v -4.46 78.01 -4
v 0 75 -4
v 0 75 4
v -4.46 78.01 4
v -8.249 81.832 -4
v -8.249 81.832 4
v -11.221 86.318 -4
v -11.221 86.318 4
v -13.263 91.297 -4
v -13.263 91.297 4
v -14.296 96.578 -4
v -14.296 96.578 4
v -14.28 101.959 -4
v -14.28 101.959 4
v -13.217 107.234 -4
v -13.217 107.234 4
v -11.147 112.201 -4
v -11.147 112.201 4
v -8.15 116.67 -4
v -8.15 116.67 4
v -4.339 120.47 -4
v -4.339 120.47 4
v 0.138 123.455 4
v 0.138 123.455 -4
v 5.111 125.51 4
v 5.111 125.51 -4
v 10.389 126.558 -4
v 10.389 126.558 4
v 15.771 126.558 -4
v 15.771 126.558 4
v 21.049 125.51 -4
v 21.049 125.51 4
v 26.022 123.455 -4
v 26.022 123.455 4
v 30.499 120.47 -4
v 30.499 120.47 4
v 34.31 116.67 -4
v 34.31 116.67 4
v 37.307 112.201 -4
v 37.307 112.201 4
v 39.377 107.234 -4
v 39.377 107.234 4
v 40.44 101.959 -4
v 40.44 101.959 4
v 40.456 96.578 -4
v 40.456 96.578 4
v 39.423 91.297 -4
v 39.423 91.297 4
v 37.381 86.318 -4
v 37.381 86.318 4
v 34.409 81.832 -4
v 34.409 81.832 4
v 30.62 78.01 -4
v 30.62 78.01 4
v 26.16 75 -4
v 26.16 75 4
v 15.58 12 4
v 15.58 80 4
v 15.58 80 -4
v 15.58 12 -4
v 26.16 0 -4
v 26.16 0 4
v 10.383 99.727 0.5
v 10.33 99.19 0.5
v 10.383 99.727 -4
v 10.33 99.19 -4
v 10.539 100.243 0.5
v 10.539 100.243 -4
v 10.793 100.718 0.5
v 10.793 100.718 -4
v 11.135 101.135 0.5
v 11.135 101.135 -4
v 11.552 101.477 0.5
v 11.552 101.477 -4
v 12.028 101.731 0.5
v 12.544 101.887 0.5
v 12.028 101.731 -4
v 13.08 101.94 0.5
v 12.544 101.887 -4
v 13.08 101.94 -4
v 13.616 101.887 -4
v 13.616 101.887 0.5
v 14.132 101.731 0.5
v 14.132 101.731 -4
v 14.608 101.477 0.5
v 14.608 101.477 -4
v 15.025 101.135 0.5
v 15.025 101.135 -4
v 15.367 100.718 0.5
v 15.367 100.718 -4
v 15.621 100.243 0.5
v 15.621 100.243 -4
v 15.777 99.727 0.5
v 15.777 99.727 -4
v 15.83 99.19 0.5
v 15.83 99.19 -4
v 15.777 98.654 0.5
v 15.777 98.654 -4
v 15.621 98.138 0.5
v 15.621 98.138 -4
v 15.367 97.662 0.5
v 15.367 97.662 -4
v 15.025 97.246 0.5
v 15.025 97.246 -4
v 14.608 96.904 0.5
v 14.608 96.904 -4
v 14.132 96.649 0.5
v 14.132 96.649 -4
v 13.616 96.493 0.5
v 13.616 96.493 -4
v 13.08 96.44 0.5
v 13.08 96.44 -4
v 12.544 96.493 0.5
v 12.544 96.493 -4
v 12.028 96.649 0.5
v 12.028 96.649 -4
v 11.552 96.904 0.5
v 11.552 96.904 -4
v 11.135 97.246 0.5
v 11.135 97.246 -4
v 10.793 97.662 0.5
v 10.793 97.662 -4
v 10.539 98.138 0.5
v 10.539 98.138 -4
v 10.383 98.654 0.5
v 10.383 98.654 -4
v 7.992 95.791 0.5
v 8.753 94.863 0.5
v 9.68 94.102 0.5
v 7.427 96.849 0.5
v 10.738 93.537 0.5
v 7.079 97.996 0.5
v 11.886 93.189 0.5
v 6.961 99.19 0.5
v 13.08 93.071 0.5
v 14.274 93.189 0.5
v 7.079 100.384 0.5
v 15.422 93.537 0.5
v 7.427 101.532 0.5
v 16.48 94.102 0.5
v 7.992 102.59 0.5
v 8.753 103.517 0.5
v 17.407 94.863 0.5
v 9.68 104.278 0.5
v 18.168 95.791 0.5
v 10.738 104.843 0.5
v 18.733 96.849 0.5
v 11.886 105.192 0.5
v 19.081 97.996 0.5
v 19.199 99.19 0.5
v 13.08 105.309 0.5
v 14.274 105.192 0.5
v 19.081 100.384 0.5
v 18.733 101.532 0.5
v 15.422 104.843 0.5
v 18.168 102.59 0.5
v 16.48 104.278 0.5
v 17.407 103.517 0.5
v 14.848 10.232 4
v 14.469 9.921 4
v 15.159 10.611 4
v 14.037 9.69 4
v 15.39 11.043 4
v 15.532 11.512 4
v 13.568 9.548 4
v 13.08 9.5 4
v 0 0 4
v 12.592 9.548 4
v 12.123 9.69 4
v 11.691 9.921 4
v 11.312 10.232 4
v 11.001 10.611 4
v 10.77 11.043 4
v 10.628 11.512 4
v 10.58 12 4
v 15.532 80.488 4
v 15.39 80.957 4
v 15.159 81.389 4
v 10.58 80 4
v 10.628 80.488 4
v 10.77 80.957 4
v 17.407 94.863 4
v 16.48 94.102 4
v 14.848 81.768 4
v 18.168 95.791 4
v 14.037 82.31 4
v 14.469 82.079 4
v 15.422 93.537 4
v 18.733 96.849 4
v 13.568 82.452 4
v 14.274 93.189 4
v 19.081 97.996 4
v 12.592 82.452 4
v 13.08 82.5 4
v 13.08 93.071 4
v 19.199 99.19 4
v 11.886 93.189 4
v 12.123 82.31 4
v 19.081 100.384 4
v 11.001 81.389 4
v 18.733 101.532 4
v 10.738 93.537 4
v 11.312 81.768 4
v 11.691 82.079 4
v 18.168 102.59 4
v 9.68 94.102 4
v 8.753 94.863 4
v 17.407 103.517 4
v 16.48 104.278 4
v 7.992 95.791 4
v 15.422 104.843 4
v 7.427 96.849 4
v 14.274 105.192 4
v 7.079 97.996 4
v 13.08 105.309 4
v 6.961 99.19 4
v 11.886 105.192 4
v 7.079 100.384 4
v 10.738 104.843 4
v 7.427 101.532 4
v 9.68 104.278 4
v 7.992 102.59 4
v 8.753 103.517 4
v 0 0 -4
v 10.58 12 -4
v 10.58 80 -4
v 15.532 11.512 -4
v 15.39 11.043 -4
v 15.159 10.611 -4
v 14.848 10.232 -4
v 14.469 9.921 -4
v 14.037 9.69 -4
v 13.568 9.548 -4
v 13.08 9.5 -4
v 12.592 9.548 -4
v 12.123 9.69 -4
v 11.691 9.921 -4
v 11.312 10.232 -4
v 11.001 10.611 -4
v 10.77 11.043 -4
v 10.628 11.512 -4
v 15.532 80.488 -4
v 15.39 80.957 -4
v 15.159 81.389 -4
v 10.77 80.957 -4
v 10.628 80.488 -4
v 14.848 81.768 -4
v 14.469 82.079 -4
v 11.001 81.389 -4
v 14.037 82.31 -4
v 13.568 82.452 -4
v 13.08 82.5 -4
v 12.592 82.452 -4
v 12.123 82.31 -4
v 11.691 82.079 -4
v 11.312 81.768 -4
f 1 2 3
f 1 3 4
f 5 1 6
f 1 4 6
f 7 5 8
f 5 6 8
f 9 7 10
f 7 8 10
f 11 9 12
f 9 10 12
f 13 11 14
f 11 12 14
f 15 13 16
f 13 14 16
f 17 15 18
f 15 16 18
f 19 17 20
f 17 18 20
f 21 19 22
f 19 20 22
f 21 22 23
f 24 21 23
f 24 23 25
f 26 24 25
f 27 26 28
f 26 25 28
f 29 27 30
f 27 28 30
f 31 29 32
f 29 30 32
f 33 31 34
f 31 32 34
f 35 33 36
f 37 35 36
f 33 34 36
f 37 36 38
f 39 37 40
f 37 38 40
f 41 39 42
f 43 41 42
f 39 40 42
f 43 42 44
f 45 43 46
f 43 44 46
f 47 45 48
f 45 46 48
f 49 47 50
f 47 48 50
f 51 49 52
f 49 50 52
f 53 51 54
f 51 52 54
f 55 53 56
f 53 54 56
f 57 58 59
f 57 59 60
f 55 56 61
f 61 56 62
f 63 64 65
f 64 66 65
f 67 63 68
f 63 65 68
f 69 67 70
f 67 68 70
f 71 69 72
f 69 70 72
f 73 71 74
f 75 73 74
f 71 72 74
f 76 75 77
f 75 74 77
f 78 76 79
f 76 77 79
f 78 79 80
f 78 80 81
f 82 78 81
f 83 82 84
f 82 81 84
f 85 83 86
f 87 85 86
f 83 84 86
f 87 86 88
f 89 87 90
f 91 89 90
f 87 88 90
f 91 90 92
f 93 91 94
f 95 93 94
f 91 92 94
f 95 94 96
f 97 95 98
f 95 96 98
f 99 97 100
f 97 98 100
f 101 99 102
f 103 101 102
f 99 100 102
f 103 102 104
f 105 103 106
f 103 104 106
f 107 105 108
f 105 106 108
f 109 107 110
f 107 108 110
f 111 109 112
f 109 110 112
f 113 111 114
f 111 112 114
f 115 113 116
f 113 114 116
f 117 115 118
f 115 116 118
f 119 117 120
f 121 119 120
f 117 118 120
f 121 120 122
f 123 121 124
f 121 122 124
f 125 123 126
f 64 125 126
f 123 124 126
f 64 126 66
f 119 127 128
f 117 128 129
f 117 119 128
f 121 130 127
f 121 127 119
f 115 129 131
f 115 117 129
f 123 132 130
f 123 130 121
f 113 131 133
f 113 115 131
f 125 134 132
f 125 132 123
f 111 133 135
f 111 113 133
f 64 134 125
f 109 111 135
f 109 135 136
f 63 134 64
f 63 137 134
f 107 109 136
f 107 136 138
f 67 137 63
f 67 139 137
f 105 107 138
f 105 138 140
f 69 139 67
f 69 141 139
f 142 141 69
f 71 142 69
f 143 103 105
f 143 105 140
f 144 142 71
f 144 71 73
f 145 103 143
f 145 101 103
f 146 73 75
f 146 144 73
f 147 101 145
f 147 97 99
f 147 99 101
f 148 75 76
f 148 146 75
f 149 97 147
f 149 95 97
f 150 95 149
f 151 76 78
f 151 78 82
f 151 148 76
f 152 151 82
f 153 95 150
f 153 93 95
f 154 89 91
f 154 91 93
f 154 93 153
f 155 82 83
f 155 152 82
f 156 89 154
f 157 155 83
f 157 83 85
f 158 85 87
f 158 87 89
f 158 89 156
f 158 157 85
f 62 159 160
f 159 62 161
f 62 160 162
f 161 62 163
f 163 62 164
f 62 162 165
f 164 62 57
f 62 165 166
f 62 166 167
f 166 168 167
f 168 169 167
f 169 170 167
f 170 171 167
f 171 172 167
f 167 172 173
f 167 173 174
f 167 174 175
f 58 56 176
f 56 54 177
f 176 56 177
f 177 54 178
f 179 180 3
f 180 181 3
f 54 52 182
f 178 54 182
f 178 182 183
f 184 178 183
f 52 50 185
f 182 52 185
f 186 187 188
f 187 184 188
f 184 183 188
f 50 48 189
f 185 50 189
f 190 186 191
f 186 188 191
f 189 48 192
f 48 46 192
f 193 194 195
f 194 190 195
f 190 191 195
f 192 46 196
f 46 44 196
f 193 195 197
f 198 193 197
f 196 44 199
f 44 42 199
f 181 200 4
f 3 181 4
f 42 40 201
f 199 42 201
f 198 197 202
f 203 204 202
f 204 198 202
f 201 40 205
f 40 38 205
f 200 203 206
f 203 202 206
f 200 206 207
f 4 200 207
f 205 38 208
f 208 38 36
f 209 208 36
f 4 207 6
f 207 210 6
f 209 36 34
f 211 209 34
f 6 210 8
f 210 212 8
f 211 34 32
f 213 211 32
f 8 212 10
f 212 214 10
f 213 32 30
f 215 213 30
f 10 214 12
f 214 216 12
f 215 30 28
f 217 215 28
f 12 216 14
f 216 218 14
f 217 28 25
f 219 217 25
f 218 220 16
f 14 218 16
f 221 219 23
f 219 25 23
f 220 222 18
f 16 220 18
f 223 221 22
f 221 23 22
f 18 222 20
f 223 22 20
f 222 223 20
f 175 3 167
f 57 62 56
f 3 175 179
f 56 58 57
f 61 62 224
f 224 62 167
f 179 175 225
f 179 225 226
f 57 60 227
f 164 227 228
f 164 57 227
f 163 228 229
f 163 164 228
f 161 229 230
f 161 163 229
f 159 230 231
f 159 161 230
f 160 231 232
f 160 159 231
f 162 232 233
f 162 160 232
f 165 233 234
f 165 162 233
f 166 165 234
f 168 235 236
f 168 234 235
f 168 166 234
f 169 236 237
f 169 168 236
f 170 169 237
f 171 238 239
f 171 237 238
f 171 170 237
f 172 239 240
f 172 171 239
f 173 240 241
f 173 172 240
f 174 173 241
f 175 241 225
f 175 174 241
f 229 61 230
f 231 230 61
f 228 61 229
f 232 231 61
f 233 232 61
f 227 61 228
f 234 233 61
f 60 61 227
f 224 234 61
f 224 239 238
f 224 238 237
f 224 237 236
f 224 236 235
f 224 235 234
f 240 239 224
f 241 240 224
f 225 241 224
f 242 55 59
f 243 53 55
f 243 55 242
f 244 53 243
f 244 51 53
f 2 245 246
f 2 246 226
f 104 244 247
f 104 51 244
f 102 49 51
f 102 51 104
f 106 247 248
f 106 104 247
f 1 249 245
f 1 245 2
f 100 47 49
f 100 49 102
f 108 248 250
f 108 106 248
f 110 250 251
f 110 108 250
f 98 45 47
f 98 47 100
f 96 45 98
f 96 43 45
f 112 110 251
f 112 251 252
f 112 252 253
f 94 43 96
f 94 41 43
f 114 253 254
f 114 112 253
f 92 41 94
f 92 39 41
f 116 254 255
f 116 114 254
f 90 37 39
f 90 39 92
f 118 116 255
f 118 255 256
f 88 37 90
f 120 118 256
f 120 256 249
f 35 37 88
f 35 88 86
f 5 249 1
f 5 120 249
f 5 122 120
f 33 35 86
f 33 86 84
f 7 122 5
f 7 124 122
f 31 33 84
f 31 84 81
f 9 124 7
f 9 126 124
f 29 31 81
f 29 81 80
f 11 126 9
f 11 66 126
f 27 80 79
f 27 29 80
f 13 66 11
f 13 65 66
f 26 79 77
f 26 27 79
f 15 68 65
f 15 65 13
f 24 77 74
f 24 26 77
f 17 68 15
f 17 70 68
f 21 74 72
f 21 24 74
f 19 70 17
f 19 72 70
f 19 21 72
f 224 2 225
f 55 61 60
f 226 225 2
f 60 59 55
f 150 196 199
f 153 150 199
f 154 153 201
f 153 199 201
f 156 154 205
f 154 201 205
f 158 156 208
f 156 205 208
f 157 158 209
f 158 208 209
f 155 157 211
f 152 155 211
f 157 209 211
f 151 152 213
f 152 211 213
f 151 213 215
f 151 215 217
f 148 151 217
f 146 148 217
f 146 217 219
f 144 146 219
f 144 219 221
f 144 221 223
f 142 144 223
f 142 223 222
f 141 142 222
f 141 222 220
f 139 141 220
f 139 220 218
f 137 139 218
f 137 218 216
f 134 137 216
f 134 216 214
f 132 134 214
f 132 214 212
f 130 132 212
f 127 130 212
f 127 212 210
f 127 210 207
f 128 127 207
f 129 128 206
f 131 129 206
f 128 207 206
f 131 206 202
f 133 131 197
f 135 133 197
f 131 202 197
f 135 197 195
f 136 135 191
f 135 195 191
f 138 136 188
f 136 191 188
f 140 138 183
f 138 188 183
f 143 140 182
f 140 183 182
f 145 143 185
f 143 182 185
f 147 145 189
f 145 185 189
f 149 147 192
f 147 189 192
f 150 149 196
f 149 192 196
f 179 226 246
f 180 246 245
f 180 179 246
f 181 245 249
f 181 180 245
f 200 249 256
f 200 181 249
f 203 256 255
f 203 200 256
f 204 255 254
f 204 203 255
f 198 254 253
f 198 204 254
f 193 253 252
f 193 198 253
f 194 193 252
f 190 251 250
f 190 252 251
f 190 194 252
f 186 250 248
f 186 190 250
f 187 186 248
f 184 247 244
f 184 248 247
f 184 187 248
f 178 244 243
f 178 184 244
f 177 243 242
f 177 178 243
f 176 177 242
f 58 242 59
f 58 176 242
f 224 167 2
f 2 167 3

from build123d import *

# Parameters (mm, degrees)
ESTRUSIONE_ESTRUSIONE1_DEPTH                         = 4
TAGLIO_ESTRUSIONE1_DEPTH                             = 134.270896221
FORO_LAMATO_PER_BULLONE_M5_A_TESTA_ESAGO_D           = 5.5
FORO_LAMATO_PER_BULLONE_M5_A_TESTA_ESAGO_CBORE_D     = 12.238
FORO_LAMATO_PER_BULLONE_M5_A_TESTA_ESAGO_CBORE_DEPTH = 3.5


with BuildPart() as part:
    # Schizzo1 → Estrusione-Estrusione1 (new, symmetric)
    with BuildSketch(Plane.XY):
        with BuildLine():
            Line((0, 0), (0, 75))
            ThreePointArc((0, 75), (13.08, 126.690155022), (26.16, 75))
            Line((26.16, 75), (26.16, 0))
            Line((26.16, 0), (0, 0))
        make_face()
    extrude(amount=ESTRUSIONE_ESTRUSIONE1_DEPTH, both=True)

    # Schizzo2 → Taglio-Estrusione1 (cut, through all)
    with BuildSketch(Plane.XY.offset(4)):
        with BuildLine():
            Line((10.58, 12), (10.58, 80))
            ThreePointArc((10.58, 80), (13.08, 82.5), (15.58, 80))
            Line((15.58, 80), (15.58, 12))
            ThreePointArc((15.58, 12), (13.08, 9.5), (10.58, 12))
        make_face()
    extrude(amount=-TAGLIO_ESTRUSIONE1_DEPTH, mode=Mode.SUBTRACT)

    # Foro lamato per Bullone M5 a testa esagonale-1 (through all)
    with Locations(Plane.XY.offset(4)):
        with Locations((13.08, 99.190155022)):
            CounterBoreHole(FORO_LAMATO_PER_BULLONE_M5_A_TESTA_ESAGO_D / 2, FORO_LAMATO_PER_BULLONE_M5_A_TESTA_ESAGO_CBORE_D / 2, FORO_LAMATO_PER_BULLONE_M5_A_TESTA_ESAGO_CBORE_DEPTH)


solid = part.part
